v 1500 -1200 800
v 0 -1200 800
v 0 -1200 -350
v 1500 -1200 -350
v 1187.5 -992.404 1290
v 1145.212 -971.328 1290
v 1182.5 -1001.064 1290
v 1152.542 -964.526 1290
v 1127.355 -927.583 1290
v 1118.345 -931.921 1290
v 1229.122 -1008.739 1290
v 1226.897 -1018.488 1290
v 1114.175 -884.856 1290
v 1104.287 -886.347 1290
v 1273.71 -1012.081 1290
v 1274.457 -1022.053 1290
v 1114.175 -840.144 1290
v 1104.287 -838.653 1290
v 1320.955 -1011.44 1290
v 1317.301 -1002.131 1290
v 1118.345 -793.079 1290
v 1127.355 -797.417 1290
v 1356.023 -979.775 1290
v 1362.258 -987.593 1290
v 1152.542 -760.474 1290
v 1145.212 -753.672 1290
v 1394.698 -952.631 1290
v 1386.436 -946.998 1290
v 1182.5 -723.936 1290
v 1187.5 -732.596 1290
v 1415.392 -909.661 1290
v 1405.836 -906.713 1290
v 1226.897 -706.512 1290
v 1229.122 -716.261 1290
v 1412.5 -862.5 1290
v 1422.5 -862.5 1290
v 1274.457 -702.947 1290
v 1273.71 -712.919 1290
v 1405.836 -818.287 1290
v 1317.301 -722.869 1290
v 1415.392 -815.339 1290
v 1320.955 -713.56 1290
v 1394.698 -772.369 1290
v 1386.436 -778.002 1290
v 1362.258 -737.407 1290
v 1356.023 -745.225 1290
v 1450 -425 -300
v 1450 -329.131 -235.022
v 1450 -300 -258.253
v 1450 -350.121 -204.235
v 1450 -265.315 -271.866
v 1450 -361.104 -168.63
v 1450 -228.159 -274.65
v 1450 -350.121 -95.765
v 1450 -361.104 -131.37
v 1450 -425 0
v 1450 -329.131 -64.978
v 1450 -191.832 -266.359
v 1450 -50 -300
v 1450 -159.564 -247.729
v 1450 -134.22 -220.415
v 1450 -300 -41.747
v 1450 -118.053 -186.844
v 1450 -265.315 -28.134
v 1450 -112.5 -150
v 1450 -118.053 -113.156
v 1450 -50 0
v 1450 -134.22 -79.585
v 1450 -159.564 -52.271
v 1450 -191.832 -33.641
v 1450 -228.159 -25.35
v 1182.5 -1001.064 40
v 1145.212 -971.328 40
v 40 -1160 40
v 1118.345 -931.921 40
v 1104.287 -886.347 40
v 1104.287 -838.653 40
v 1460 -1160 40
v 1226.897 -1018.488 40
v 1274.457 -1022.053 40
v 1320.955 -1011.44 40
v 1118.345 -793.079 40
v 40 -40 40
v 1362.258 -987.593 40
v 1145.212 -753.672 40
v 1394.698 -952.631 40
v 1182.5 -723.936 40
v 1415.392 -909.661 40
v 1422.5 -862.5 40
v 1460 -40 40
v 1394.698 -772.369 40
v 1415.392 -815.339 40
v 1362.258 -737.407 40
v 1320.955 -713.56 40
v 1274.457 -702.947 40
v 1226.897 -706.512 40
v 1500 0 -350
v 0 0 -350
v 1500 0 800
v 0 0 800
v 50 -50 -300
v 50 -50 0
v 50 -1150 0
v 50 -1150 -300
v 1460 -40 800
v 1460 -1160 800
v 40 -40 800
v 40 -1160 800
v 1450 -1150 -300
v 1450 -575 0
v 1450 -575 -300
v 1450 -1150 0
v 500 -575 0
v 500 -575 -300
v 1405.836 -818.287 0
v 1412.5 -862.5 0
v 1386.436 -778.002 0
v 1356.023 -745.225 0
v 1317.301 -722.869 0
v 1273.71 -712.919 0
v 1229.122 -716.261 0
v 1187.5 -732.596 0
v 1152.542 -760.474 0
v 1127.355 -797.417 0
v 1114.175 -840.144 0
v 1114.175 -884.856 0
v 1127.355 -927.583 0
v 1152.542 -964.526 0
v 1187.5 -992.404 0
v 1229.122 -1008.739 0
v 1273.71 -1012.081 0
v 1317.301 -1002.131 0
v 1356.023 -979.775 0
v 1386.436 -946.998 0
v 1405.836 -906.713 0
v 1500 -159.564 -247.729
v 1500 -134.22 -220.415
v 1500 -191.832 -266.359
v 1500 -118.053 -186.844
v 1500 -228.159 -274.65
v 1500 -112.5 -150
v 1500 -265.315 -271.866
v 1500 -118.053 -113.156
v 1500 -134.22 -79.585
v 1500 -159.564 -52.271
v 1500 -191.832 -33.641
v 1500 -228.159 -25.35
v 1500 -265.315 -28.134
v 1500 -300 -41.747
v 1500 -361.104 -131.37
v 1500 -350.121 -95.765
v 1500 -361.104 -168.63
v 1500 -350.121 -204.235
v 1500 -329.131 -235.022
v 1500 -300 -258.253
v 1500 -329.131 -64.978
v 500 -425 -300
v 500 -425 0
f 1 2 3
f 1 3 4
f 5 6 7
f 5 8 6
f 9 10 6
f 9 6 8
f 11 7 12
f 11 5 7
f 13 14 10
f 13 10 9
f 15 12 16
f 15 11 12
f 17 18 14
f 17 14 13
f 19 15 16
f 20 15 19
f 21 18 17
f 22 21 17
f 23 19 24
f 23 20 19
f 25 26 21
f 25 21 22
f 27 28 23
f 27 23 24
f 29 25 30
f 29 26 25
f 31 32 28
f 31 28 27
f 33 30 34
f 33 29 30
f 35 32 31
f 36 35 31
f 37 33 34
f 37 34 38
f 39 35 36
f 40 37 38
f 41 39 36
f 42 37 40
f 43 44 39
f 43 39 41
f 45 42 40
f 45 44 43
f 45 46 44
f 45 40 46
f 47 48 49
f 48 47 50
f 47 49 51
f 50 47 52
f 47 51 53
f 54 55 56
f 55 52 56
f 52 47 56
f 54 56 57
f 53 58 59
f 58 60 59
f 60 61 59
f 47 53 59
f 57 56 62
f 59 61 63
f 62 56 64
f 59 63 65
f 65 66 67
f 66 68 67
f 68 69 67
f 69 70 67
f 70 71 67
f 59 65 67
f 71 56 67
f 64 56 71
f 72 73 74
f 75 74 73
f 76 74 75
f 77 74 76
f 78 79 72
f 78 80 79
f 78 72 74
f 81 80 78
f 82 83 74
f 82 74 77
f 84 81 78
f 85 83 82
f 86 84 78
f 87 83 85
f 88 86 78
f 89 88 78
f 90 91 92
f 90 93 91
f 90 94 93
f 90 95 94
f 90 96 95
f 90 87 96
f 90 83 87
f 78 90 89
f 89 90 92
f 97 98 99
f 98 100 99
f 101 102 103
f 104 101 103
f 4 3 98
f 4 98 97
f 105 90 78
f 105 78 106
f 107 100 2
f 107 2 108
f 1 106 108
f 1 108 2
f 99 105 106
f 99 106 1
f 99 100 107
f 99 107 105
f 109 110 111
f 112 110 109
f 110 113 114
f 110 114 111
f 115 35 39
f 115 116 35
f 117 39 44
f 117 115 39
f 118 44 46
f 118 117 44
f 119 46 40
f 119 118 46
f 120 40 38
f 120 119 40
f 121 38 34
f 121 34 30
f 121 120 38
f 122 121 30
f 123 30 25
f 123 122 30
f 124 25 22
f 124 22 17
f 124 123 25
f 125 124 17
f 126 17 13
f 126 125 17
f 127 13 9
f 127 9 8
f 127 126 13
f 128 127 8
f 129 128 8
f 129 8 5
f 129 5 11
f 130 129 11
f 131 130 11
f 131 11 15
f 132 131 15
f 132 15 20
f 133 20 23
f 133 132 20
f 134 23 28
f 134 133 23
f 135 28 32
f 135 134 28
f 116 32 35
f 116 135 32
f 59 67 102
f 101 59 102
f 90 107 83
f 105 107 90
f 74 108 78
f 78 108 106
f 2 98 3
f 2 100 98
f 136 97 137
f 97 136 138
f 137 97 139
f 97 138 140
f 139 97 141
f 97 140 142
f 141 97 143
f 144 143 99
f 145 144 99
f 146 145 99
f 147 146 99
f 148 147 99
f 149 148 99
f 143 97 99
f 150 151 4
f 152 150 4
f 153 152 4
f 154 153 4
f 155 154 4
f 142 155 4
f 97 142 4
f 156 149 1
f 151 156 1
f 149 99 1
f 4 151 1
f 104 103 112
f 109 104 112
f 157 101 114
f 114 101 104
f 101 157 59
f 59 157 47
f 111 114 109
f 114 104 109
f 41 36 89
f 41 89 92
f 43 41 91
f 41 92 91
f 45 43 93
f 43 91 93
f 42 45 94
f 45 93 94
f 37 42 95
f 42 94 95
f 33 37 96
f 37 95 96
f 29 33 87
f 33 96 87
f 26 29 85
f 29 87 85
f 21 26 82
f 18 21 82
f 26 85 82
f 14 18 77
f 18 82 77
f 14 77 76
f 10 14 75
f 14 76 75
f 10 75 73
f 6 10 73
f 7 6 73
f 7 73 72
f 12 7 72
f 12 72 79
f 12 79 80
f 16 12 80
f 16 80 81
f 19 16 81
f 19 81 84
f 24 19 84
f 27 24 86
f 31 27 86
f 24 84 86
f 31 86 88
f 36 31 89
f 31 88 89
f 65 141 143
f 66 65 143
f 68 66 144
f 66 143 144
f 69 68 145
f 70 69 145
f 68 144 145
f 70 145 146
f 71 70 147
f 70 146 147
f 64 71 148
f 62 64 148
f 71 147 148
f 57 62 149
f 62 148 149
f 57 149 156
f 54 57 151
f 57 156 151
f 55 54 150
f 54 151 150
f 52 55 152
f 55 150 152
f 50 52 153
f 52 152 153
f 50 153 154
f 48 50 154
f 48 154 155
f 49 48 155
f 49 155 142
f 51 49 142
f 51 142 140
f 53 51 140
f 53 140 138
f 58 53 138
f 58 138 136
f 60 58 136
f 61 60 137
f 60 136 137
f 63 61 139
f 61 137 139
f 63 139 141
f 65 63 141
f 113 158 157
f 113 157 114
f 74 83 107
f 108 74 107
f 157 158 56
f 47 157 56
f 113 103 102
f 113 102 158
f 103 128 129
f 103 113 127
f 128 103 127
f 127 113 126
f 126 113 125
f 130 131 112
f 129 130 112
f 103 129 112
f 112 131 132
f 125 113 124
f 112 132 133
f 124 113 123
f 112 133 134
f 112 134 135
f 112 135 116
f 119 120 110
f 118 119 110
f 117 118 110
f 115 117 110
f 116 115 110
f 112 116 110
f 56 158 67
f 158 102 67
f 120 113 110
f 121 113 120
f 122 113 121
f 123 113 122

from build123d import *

# Parameters (mm, degrees)
F0_W      = 1500
F0_H      = 800
F1_DEPTH  = 1200
F2_T      = -40
F4_DEPTH  = 300
F5_W      = 1000
F5_H      = 150
F6_DEPTH  = 300
F7_W      = 50
F7_H      = 575
F8_DEPTH  = 300
F9_W      = 375
F9_H      = 300
F9_R      = 125
F10_DEPTH = 50
F11_R     = 150
F12_DEPTH = 50
F13_W     = 1500
F13_H     = 1200
F14_DEPTH = 50
F15_R     = 160
F15_R_2   = 150
F16_DEPTH = 1250


with BuildPart() as f1:
    # F0 (on Front) → F1 (new body)
    with BuildSketch(Plane.XZ):
        with Locations((750, 400)):
            Rectangle(F0_W, F0_H)
    extrude(amount=F1_DEPTH)

    # F2
    f2_openings = [f1.faces().sort_by_distance(p)[0] for p in [
        (750, -600, 800),
    ]]
    offset(amount=F2_T, openings=f2_openings)

    # F3 (on face) → F4 (join)
    with BuildSketch(Plane(origin=(0, 0, 0), x_dir=(1, 0, 0), z_dir=(0, 0, -1))):
        Polygon((1500, 0), (1500, 50), (50, 50), (50, 1150), (1500, 1150), (1500, 1200), (0, 1200), (0, 0), align=None)
    extrude(amount=F4_DEPTH)

    # F5 (on face) → F6 (join)
    with BuildSketch(Plane(origin=(0, 0, 0), x_dir=(1, 0, 0), z_dir=(0, 0, -1))):
        with Locations((1000, 500)):
            Rectangle(F5_W, F5_H)
    extrude(amount=F6_DEPTH)

    # F7 (on face) → F8 (join)
    with BuildSketch(Plane(origin=(0, 0, 0), x_dir=(1, 0, 0), z_dir=(0, 0, -1))):
        with Locations((1475, 862.5)):
            Rectangle(F7_W, F7_H)
    extrude(amount=F8_DEPTH)

    # F9 (on face) → F10 (join)
    with BuildSketch(Plane.YZ.offset(1500)):
        with Locations((-237.5, -150)):
            Rectangle(F9_W, F9_H)
        with Locations((-237.5, -150)):
            Circle(F9_R, mode=Mode.SUBTRACT)
    extrude(amount=-F10_DEPTH)

    # F11 (on face) → F12 (cut)
    with BuildSketch(Plane(origin=(0, 0, 0), x_dir=(1, 0, 0), z_dir=(0, 0, -1))):
        with Locations((1262.5, 862.5)):
            Circle(F11_R)
    extrude(amount=-F12_DEPTH, mode=Mode.SUBTRACT)

    # F13 (on face) → F14 (join)
    with BuildSketch(Plane(origin=(0, 0, -300), x_dir=(1, 0, 0), z_dir=(0, 0, -1))):
        with Locations((750, 600)):
            Rectangle(F13_W, F13_H)
    extrude(amount=F14_DEPTH)

    # F15 (on face) → F16 (join)
    with BuildSketch(Plane.XY.offset(40)):
        with Locations((1262.5, -862.5)):
            Circle(F15_R)
        with Locations((1262.5, -862.5)):
            Circle(F15_R_2, mode=Mode.SUBTRACT)
    extrude(amount=F16_DEPTH)


solid = f1.part
